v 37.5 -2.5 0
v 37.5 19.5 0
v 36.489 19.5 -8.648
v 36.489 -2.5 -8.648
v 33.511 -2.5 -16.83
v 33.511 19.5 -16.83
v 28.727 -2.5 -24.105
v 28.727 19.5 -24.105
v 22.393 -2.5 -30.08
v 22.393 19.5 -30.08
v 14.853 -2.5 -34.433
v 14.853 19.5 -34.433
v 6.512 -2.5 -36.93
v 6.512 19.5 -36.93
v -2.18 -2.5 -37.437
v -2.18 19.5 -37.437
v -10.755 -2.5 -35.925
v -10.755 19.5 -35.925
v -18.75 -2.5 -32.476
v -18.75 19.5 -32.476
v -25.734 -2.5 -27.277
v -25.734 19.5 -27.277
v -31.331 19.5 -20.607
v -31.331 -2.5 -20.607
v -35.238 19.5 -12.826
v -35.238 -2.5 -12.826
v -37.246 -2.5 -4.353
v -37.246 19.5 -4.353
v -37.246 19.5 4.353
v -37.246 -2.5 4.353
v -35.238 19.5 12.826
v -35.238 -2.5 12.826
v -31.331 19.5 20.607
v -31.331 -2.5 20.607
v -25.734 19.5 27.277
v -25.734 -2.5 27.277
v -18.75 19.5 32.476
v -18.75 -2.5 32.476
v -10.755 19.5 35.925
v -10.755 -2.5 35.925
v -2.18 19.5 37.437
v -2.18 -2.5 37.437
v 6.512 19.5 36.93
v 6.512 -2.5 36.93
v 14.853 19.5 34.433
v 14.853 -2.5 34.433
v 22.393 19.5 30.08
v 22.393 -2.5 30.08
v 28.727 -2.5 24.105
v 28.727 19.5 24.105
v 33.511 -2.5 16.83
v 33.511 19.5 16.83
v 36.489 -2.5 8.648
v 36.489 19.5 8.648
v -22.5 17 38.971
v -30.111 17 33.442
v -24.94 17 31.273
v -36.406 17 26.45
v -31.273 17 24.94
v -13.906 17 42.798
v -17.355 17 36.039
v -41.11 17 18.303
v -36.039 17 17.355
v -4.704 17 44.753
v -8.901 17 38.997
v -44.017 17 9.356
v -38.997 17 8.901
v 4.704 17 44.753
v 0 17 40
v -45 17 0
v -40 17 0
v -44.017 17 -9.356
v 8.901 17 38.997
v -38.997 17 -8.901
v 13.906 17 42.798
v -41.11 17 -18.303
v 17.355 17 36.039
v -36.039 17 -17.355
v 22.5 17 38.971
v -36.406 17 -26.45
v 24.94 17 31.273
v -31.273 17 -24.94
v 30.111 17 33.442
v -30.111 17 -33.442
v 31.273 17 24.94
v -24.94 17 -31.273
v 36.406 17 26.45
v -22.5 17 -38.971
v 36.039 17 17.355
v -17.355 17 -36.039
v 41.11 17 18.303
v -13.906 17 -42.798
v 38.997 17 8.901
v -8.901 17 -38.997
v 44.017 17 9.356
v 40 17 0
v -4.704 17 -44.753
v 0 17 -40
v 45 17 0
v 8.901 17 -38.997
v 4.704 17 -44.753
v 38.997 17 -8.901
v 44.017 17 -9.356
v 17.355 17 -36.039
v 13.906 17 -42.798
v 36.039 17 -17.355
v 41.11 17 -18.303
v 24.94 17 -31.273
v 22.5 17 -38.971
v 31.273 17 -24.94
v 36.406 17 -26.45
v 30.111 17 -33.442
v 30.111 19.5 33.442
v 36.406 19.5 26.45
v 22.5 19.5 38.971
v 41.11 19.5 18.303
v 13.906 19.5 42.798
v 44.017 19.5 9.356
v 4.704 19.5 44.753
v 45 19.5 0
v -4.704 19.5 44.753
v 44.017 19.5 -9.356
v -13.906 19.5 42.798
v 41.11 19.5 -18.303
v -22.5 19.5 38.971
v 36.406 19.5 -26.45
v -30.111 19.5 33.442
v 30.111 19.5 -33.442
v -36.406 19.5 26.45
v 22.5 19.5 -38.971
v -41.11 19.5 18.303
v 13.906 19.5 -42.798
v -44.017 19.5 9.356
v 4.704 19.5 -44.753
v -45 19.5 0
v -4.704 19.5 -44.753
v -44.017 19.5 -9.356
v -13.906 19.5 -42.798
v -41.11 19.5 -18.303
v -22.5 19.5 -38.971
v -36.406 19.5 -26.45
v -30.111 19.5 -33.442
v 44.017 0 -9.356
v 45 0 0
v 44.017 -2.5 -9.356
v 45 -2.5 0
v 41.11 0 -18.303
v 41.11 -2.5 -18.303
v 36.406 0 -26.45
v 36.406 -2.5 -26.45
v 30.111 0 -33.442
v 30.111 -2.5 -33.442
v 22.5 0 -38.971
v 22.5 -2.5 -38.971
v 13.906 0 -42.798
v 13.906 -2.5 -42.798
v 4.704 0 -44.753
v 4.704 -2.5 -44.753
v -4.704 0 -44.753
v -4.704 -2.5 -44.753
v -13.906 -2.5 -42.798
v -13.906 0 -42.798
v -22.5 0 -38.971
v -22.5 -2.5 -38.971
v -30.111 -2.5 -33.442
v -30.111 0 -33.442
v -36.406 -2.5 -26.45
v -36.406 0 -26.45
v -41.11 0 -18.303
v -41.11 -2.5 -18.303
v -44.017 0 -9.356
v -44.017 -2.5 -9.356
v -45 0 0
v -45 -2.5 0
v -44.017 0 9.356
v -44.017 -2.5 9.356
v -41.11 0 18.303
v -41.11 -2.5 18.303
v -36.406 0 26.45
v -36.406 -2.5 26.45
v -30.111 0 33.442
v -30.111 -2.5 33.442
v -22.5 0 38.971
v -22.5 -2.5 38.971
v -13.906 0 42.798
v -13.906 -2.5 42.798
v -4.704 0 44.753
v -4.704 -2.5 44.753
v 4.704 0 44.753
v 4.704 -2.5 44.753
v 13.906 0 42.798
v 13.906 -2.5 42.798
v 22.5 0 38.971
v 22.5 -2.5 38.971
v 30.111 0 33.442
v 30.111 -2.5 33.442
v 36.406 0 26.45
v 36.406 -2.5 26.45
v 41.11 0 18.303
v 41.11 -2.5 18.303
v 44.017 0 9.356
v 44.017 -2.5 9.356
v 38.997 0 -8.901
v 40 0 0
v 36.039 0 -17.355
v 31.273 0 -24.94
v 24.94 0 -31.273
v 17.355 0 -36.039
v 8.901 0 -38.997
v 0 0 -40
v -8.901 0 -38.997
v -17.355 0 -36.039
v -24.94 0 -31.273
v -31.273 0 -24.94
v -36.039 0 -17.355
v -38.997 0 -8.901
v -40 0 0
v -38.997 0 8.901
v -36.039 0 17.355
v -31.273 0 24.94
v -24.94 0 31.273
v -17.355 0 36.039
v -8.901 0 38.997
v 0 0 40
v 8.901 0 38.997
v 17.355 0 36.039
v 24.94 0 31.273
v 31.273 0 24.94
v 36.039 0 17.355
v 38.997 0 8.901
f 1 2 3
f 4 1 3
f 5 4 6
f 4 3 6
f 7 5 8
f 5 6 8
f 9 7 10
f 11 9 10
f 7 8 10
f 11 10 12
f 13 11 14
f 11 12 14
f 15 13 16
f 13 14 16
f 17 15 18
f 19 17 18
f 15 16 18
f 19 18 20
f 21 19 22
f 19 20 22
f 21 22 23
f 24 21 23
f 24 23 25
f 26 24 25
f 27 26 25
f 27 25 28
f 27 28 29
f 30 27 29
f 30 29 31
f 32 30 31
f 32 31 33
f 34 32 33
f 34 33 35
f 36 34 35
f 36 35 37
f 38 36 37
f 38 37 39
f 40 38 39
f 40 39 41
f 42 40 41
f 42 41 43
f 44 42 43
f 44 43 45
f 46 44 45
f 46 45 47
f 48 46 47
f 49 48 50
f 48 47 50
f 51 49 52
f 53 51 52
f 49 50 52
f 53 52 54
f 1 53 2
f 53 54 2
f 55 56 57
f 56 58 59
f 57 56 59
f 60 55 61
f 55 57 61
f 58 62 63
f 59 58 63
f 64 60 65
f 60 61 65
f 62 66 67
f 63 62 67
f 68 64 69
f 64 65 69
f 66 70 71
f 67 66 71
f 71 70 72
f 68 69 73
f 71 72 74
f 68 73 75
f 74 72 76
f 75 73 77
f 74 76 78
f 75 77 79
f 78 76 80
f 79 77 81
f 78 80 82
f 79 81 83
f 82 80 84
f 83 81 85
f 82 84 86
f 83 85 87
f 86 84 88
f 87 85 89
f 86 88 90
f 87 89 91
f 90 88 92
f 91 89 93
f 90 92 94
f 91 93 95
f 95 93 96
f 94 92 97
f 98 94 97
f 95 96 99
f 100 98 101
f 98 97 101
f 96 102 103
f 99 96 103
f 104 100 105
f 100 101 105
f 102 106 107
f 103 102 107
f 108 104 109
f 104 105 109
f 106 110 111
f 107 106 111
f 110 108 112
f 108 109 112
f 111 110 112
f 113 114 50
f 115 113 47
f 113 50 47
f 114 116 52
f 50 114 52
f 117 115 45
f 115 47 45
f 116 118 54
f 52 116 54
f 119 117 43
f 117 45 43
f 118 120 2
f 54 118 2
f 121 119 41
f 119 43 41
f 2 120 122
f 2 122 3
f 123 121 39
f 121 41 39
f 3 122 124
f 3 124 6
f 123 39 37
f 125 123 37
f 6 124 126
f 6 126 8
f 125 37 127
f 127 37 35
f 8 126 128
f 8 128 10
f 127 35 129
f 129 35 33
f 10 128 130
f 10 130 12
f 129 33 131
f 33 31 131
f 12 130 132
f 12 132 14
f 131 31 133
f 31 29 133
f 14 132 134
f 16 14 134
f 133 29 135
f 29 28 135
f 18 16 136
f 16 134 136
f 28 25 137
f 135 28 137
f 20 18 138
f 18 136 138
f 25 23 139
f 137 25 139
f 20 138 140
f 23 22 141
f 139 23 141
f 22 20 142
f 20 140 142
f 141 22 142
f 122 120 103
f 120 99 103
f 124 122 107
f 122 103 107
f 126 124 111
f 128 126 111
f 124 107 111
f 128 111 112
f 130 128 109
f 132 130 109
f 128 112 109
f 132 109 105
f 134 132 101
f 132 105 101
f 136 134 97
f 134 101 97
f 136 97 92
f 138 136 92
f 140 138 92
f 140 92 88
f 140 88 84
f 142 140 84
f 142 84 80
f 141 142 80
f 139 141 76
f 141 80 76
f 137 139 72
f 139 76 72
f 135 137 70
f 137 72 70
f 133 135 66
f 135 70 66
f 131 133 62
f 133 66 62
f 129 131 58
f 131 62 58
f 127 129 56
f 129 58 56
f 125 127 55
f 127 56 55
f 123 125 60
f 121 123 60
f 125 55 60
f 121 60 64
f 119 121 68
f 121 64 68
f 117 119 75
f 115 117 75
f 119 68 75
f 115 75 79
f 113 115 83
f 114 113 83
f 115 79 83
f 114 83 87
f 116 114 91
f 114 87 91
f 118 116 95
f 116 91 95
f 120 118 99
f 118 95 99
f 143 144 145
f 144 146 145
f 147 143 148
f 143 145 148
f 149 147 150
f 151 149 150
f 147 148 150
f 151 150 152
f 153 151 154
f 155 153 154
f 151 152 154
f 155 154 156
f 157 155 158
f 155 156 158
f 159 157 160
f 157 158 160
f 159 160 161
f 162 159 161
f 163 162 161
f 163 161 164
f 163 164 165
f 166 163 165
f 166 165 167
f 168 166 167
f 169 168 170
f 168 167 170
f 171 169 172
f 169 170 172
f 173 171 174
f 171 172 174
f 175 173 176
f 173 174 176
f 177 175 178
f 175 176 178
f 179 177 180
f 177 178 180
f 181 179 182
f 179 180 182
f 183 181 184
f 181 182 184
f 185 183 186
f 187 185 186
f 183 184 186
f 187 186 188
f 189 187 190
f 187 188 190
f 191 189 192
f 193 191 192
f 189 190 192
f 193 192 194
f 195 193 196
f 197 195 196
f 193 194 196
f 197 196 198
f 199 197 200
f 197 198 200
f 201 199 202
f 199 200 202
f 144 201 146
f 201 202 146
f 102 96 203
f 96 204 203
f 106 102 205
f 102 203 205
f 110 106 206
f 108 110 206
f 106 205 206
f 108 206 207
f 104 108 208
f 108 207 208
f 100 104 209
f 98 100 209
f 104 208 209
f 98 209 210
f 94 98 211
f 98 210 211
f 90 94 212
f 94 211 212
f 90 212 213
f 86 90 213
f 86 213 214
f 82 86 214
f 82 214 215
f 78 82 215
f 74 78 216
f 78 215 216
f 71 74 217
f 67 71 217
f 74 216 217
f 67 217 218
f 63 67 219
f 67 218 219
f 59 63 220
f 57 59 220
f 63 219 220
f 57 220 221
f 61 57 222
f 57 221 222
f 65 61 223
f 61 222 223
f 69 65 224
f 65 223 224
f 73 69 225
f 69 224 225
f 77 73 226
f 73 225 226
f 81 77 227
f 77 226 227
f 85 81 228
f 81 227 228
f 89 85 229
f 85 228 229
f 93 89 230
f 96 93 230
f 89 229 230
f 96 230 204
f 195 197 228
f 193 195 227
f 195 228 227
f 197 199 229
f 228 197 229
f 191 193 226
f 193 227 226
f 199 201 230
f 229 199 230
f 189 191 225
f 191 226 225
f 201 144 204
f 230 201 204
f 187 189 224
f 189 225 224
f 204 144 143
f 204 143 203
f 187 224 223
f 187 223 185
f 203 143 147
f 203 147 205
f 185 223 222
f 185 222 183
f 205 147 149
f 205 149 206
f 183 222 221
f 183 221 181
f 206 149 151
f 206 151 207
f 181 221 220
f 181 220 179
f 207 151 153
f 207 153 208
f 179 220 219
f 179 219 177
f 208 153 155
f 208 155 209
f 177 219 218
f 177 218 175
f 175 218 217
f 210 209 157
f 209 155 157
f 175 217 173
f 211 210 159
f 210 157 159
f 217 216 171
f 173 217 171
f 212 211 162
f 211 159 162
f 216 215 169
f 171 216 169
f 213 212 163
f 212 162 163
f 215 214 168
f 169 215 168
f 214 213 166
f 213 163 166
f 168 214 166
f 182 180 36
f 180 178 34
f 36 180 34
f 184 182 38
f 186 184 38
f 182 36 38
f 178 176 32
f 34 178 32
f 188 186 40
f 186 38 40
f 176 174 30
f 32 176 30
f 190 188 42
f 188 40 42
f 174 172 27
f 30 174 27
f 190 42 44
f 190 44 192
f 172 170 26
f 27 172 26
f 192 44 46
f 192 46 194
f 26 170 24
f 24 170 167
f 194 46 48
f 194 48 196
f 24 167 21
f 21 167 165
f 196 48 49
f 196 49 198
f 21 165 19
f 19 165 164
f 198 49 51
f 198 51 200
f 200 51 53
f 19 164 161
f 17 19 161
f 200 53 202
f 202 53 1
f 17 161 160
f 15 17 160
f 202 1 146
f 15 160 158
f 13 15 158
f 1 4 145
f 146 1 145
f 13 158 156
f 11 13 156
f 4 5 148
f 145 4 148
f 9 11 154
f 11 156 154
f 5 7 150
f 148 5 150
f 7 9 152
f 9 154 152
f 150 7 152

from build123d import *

# Parameters (mm, degrees)
CUT_EXTRUDE1_REACH = 4.5
SKETCH2_R          = 37.5


with BuildPart() as part:
    # Sketch1 → Revolve1 (revolve)
    with BuildSketch(Plane.XY):
        Polygon((0, 0), (37.5, 0), (37.5, 19.5), (45, 19.5), (45, 17), (40, 17), (40, 0), (45, 0), (45, -2.5), (0, -2.5), align=None)
    revolve(axis=Axis((0, -2.5, 0), (0, 1, 0)))

    # Sketch2 → Cut-Extrude1 (cut, up to next)
    with BuildSketch(Plane(origin=(0, 0, 0), x_dir=(1, 0, 0), z_dir=(0, 1, 0)), mode=Mode.PRIVATE) as cut_extrude1_sk1:
        Circle(SKETCH2_R)
    cut_extrude1_tool1 = extrude(cut_extrude1_sk1.sketch, amount=-CUT_EXTRUDE1_REACH, mode=Mode.PRIVATE) & part.part
    add(cut_extrude1_tool1.solids().sort_by_distance((0, 0, 0))[0], mode=Mode.SUBTRACT)


solid = part.part
